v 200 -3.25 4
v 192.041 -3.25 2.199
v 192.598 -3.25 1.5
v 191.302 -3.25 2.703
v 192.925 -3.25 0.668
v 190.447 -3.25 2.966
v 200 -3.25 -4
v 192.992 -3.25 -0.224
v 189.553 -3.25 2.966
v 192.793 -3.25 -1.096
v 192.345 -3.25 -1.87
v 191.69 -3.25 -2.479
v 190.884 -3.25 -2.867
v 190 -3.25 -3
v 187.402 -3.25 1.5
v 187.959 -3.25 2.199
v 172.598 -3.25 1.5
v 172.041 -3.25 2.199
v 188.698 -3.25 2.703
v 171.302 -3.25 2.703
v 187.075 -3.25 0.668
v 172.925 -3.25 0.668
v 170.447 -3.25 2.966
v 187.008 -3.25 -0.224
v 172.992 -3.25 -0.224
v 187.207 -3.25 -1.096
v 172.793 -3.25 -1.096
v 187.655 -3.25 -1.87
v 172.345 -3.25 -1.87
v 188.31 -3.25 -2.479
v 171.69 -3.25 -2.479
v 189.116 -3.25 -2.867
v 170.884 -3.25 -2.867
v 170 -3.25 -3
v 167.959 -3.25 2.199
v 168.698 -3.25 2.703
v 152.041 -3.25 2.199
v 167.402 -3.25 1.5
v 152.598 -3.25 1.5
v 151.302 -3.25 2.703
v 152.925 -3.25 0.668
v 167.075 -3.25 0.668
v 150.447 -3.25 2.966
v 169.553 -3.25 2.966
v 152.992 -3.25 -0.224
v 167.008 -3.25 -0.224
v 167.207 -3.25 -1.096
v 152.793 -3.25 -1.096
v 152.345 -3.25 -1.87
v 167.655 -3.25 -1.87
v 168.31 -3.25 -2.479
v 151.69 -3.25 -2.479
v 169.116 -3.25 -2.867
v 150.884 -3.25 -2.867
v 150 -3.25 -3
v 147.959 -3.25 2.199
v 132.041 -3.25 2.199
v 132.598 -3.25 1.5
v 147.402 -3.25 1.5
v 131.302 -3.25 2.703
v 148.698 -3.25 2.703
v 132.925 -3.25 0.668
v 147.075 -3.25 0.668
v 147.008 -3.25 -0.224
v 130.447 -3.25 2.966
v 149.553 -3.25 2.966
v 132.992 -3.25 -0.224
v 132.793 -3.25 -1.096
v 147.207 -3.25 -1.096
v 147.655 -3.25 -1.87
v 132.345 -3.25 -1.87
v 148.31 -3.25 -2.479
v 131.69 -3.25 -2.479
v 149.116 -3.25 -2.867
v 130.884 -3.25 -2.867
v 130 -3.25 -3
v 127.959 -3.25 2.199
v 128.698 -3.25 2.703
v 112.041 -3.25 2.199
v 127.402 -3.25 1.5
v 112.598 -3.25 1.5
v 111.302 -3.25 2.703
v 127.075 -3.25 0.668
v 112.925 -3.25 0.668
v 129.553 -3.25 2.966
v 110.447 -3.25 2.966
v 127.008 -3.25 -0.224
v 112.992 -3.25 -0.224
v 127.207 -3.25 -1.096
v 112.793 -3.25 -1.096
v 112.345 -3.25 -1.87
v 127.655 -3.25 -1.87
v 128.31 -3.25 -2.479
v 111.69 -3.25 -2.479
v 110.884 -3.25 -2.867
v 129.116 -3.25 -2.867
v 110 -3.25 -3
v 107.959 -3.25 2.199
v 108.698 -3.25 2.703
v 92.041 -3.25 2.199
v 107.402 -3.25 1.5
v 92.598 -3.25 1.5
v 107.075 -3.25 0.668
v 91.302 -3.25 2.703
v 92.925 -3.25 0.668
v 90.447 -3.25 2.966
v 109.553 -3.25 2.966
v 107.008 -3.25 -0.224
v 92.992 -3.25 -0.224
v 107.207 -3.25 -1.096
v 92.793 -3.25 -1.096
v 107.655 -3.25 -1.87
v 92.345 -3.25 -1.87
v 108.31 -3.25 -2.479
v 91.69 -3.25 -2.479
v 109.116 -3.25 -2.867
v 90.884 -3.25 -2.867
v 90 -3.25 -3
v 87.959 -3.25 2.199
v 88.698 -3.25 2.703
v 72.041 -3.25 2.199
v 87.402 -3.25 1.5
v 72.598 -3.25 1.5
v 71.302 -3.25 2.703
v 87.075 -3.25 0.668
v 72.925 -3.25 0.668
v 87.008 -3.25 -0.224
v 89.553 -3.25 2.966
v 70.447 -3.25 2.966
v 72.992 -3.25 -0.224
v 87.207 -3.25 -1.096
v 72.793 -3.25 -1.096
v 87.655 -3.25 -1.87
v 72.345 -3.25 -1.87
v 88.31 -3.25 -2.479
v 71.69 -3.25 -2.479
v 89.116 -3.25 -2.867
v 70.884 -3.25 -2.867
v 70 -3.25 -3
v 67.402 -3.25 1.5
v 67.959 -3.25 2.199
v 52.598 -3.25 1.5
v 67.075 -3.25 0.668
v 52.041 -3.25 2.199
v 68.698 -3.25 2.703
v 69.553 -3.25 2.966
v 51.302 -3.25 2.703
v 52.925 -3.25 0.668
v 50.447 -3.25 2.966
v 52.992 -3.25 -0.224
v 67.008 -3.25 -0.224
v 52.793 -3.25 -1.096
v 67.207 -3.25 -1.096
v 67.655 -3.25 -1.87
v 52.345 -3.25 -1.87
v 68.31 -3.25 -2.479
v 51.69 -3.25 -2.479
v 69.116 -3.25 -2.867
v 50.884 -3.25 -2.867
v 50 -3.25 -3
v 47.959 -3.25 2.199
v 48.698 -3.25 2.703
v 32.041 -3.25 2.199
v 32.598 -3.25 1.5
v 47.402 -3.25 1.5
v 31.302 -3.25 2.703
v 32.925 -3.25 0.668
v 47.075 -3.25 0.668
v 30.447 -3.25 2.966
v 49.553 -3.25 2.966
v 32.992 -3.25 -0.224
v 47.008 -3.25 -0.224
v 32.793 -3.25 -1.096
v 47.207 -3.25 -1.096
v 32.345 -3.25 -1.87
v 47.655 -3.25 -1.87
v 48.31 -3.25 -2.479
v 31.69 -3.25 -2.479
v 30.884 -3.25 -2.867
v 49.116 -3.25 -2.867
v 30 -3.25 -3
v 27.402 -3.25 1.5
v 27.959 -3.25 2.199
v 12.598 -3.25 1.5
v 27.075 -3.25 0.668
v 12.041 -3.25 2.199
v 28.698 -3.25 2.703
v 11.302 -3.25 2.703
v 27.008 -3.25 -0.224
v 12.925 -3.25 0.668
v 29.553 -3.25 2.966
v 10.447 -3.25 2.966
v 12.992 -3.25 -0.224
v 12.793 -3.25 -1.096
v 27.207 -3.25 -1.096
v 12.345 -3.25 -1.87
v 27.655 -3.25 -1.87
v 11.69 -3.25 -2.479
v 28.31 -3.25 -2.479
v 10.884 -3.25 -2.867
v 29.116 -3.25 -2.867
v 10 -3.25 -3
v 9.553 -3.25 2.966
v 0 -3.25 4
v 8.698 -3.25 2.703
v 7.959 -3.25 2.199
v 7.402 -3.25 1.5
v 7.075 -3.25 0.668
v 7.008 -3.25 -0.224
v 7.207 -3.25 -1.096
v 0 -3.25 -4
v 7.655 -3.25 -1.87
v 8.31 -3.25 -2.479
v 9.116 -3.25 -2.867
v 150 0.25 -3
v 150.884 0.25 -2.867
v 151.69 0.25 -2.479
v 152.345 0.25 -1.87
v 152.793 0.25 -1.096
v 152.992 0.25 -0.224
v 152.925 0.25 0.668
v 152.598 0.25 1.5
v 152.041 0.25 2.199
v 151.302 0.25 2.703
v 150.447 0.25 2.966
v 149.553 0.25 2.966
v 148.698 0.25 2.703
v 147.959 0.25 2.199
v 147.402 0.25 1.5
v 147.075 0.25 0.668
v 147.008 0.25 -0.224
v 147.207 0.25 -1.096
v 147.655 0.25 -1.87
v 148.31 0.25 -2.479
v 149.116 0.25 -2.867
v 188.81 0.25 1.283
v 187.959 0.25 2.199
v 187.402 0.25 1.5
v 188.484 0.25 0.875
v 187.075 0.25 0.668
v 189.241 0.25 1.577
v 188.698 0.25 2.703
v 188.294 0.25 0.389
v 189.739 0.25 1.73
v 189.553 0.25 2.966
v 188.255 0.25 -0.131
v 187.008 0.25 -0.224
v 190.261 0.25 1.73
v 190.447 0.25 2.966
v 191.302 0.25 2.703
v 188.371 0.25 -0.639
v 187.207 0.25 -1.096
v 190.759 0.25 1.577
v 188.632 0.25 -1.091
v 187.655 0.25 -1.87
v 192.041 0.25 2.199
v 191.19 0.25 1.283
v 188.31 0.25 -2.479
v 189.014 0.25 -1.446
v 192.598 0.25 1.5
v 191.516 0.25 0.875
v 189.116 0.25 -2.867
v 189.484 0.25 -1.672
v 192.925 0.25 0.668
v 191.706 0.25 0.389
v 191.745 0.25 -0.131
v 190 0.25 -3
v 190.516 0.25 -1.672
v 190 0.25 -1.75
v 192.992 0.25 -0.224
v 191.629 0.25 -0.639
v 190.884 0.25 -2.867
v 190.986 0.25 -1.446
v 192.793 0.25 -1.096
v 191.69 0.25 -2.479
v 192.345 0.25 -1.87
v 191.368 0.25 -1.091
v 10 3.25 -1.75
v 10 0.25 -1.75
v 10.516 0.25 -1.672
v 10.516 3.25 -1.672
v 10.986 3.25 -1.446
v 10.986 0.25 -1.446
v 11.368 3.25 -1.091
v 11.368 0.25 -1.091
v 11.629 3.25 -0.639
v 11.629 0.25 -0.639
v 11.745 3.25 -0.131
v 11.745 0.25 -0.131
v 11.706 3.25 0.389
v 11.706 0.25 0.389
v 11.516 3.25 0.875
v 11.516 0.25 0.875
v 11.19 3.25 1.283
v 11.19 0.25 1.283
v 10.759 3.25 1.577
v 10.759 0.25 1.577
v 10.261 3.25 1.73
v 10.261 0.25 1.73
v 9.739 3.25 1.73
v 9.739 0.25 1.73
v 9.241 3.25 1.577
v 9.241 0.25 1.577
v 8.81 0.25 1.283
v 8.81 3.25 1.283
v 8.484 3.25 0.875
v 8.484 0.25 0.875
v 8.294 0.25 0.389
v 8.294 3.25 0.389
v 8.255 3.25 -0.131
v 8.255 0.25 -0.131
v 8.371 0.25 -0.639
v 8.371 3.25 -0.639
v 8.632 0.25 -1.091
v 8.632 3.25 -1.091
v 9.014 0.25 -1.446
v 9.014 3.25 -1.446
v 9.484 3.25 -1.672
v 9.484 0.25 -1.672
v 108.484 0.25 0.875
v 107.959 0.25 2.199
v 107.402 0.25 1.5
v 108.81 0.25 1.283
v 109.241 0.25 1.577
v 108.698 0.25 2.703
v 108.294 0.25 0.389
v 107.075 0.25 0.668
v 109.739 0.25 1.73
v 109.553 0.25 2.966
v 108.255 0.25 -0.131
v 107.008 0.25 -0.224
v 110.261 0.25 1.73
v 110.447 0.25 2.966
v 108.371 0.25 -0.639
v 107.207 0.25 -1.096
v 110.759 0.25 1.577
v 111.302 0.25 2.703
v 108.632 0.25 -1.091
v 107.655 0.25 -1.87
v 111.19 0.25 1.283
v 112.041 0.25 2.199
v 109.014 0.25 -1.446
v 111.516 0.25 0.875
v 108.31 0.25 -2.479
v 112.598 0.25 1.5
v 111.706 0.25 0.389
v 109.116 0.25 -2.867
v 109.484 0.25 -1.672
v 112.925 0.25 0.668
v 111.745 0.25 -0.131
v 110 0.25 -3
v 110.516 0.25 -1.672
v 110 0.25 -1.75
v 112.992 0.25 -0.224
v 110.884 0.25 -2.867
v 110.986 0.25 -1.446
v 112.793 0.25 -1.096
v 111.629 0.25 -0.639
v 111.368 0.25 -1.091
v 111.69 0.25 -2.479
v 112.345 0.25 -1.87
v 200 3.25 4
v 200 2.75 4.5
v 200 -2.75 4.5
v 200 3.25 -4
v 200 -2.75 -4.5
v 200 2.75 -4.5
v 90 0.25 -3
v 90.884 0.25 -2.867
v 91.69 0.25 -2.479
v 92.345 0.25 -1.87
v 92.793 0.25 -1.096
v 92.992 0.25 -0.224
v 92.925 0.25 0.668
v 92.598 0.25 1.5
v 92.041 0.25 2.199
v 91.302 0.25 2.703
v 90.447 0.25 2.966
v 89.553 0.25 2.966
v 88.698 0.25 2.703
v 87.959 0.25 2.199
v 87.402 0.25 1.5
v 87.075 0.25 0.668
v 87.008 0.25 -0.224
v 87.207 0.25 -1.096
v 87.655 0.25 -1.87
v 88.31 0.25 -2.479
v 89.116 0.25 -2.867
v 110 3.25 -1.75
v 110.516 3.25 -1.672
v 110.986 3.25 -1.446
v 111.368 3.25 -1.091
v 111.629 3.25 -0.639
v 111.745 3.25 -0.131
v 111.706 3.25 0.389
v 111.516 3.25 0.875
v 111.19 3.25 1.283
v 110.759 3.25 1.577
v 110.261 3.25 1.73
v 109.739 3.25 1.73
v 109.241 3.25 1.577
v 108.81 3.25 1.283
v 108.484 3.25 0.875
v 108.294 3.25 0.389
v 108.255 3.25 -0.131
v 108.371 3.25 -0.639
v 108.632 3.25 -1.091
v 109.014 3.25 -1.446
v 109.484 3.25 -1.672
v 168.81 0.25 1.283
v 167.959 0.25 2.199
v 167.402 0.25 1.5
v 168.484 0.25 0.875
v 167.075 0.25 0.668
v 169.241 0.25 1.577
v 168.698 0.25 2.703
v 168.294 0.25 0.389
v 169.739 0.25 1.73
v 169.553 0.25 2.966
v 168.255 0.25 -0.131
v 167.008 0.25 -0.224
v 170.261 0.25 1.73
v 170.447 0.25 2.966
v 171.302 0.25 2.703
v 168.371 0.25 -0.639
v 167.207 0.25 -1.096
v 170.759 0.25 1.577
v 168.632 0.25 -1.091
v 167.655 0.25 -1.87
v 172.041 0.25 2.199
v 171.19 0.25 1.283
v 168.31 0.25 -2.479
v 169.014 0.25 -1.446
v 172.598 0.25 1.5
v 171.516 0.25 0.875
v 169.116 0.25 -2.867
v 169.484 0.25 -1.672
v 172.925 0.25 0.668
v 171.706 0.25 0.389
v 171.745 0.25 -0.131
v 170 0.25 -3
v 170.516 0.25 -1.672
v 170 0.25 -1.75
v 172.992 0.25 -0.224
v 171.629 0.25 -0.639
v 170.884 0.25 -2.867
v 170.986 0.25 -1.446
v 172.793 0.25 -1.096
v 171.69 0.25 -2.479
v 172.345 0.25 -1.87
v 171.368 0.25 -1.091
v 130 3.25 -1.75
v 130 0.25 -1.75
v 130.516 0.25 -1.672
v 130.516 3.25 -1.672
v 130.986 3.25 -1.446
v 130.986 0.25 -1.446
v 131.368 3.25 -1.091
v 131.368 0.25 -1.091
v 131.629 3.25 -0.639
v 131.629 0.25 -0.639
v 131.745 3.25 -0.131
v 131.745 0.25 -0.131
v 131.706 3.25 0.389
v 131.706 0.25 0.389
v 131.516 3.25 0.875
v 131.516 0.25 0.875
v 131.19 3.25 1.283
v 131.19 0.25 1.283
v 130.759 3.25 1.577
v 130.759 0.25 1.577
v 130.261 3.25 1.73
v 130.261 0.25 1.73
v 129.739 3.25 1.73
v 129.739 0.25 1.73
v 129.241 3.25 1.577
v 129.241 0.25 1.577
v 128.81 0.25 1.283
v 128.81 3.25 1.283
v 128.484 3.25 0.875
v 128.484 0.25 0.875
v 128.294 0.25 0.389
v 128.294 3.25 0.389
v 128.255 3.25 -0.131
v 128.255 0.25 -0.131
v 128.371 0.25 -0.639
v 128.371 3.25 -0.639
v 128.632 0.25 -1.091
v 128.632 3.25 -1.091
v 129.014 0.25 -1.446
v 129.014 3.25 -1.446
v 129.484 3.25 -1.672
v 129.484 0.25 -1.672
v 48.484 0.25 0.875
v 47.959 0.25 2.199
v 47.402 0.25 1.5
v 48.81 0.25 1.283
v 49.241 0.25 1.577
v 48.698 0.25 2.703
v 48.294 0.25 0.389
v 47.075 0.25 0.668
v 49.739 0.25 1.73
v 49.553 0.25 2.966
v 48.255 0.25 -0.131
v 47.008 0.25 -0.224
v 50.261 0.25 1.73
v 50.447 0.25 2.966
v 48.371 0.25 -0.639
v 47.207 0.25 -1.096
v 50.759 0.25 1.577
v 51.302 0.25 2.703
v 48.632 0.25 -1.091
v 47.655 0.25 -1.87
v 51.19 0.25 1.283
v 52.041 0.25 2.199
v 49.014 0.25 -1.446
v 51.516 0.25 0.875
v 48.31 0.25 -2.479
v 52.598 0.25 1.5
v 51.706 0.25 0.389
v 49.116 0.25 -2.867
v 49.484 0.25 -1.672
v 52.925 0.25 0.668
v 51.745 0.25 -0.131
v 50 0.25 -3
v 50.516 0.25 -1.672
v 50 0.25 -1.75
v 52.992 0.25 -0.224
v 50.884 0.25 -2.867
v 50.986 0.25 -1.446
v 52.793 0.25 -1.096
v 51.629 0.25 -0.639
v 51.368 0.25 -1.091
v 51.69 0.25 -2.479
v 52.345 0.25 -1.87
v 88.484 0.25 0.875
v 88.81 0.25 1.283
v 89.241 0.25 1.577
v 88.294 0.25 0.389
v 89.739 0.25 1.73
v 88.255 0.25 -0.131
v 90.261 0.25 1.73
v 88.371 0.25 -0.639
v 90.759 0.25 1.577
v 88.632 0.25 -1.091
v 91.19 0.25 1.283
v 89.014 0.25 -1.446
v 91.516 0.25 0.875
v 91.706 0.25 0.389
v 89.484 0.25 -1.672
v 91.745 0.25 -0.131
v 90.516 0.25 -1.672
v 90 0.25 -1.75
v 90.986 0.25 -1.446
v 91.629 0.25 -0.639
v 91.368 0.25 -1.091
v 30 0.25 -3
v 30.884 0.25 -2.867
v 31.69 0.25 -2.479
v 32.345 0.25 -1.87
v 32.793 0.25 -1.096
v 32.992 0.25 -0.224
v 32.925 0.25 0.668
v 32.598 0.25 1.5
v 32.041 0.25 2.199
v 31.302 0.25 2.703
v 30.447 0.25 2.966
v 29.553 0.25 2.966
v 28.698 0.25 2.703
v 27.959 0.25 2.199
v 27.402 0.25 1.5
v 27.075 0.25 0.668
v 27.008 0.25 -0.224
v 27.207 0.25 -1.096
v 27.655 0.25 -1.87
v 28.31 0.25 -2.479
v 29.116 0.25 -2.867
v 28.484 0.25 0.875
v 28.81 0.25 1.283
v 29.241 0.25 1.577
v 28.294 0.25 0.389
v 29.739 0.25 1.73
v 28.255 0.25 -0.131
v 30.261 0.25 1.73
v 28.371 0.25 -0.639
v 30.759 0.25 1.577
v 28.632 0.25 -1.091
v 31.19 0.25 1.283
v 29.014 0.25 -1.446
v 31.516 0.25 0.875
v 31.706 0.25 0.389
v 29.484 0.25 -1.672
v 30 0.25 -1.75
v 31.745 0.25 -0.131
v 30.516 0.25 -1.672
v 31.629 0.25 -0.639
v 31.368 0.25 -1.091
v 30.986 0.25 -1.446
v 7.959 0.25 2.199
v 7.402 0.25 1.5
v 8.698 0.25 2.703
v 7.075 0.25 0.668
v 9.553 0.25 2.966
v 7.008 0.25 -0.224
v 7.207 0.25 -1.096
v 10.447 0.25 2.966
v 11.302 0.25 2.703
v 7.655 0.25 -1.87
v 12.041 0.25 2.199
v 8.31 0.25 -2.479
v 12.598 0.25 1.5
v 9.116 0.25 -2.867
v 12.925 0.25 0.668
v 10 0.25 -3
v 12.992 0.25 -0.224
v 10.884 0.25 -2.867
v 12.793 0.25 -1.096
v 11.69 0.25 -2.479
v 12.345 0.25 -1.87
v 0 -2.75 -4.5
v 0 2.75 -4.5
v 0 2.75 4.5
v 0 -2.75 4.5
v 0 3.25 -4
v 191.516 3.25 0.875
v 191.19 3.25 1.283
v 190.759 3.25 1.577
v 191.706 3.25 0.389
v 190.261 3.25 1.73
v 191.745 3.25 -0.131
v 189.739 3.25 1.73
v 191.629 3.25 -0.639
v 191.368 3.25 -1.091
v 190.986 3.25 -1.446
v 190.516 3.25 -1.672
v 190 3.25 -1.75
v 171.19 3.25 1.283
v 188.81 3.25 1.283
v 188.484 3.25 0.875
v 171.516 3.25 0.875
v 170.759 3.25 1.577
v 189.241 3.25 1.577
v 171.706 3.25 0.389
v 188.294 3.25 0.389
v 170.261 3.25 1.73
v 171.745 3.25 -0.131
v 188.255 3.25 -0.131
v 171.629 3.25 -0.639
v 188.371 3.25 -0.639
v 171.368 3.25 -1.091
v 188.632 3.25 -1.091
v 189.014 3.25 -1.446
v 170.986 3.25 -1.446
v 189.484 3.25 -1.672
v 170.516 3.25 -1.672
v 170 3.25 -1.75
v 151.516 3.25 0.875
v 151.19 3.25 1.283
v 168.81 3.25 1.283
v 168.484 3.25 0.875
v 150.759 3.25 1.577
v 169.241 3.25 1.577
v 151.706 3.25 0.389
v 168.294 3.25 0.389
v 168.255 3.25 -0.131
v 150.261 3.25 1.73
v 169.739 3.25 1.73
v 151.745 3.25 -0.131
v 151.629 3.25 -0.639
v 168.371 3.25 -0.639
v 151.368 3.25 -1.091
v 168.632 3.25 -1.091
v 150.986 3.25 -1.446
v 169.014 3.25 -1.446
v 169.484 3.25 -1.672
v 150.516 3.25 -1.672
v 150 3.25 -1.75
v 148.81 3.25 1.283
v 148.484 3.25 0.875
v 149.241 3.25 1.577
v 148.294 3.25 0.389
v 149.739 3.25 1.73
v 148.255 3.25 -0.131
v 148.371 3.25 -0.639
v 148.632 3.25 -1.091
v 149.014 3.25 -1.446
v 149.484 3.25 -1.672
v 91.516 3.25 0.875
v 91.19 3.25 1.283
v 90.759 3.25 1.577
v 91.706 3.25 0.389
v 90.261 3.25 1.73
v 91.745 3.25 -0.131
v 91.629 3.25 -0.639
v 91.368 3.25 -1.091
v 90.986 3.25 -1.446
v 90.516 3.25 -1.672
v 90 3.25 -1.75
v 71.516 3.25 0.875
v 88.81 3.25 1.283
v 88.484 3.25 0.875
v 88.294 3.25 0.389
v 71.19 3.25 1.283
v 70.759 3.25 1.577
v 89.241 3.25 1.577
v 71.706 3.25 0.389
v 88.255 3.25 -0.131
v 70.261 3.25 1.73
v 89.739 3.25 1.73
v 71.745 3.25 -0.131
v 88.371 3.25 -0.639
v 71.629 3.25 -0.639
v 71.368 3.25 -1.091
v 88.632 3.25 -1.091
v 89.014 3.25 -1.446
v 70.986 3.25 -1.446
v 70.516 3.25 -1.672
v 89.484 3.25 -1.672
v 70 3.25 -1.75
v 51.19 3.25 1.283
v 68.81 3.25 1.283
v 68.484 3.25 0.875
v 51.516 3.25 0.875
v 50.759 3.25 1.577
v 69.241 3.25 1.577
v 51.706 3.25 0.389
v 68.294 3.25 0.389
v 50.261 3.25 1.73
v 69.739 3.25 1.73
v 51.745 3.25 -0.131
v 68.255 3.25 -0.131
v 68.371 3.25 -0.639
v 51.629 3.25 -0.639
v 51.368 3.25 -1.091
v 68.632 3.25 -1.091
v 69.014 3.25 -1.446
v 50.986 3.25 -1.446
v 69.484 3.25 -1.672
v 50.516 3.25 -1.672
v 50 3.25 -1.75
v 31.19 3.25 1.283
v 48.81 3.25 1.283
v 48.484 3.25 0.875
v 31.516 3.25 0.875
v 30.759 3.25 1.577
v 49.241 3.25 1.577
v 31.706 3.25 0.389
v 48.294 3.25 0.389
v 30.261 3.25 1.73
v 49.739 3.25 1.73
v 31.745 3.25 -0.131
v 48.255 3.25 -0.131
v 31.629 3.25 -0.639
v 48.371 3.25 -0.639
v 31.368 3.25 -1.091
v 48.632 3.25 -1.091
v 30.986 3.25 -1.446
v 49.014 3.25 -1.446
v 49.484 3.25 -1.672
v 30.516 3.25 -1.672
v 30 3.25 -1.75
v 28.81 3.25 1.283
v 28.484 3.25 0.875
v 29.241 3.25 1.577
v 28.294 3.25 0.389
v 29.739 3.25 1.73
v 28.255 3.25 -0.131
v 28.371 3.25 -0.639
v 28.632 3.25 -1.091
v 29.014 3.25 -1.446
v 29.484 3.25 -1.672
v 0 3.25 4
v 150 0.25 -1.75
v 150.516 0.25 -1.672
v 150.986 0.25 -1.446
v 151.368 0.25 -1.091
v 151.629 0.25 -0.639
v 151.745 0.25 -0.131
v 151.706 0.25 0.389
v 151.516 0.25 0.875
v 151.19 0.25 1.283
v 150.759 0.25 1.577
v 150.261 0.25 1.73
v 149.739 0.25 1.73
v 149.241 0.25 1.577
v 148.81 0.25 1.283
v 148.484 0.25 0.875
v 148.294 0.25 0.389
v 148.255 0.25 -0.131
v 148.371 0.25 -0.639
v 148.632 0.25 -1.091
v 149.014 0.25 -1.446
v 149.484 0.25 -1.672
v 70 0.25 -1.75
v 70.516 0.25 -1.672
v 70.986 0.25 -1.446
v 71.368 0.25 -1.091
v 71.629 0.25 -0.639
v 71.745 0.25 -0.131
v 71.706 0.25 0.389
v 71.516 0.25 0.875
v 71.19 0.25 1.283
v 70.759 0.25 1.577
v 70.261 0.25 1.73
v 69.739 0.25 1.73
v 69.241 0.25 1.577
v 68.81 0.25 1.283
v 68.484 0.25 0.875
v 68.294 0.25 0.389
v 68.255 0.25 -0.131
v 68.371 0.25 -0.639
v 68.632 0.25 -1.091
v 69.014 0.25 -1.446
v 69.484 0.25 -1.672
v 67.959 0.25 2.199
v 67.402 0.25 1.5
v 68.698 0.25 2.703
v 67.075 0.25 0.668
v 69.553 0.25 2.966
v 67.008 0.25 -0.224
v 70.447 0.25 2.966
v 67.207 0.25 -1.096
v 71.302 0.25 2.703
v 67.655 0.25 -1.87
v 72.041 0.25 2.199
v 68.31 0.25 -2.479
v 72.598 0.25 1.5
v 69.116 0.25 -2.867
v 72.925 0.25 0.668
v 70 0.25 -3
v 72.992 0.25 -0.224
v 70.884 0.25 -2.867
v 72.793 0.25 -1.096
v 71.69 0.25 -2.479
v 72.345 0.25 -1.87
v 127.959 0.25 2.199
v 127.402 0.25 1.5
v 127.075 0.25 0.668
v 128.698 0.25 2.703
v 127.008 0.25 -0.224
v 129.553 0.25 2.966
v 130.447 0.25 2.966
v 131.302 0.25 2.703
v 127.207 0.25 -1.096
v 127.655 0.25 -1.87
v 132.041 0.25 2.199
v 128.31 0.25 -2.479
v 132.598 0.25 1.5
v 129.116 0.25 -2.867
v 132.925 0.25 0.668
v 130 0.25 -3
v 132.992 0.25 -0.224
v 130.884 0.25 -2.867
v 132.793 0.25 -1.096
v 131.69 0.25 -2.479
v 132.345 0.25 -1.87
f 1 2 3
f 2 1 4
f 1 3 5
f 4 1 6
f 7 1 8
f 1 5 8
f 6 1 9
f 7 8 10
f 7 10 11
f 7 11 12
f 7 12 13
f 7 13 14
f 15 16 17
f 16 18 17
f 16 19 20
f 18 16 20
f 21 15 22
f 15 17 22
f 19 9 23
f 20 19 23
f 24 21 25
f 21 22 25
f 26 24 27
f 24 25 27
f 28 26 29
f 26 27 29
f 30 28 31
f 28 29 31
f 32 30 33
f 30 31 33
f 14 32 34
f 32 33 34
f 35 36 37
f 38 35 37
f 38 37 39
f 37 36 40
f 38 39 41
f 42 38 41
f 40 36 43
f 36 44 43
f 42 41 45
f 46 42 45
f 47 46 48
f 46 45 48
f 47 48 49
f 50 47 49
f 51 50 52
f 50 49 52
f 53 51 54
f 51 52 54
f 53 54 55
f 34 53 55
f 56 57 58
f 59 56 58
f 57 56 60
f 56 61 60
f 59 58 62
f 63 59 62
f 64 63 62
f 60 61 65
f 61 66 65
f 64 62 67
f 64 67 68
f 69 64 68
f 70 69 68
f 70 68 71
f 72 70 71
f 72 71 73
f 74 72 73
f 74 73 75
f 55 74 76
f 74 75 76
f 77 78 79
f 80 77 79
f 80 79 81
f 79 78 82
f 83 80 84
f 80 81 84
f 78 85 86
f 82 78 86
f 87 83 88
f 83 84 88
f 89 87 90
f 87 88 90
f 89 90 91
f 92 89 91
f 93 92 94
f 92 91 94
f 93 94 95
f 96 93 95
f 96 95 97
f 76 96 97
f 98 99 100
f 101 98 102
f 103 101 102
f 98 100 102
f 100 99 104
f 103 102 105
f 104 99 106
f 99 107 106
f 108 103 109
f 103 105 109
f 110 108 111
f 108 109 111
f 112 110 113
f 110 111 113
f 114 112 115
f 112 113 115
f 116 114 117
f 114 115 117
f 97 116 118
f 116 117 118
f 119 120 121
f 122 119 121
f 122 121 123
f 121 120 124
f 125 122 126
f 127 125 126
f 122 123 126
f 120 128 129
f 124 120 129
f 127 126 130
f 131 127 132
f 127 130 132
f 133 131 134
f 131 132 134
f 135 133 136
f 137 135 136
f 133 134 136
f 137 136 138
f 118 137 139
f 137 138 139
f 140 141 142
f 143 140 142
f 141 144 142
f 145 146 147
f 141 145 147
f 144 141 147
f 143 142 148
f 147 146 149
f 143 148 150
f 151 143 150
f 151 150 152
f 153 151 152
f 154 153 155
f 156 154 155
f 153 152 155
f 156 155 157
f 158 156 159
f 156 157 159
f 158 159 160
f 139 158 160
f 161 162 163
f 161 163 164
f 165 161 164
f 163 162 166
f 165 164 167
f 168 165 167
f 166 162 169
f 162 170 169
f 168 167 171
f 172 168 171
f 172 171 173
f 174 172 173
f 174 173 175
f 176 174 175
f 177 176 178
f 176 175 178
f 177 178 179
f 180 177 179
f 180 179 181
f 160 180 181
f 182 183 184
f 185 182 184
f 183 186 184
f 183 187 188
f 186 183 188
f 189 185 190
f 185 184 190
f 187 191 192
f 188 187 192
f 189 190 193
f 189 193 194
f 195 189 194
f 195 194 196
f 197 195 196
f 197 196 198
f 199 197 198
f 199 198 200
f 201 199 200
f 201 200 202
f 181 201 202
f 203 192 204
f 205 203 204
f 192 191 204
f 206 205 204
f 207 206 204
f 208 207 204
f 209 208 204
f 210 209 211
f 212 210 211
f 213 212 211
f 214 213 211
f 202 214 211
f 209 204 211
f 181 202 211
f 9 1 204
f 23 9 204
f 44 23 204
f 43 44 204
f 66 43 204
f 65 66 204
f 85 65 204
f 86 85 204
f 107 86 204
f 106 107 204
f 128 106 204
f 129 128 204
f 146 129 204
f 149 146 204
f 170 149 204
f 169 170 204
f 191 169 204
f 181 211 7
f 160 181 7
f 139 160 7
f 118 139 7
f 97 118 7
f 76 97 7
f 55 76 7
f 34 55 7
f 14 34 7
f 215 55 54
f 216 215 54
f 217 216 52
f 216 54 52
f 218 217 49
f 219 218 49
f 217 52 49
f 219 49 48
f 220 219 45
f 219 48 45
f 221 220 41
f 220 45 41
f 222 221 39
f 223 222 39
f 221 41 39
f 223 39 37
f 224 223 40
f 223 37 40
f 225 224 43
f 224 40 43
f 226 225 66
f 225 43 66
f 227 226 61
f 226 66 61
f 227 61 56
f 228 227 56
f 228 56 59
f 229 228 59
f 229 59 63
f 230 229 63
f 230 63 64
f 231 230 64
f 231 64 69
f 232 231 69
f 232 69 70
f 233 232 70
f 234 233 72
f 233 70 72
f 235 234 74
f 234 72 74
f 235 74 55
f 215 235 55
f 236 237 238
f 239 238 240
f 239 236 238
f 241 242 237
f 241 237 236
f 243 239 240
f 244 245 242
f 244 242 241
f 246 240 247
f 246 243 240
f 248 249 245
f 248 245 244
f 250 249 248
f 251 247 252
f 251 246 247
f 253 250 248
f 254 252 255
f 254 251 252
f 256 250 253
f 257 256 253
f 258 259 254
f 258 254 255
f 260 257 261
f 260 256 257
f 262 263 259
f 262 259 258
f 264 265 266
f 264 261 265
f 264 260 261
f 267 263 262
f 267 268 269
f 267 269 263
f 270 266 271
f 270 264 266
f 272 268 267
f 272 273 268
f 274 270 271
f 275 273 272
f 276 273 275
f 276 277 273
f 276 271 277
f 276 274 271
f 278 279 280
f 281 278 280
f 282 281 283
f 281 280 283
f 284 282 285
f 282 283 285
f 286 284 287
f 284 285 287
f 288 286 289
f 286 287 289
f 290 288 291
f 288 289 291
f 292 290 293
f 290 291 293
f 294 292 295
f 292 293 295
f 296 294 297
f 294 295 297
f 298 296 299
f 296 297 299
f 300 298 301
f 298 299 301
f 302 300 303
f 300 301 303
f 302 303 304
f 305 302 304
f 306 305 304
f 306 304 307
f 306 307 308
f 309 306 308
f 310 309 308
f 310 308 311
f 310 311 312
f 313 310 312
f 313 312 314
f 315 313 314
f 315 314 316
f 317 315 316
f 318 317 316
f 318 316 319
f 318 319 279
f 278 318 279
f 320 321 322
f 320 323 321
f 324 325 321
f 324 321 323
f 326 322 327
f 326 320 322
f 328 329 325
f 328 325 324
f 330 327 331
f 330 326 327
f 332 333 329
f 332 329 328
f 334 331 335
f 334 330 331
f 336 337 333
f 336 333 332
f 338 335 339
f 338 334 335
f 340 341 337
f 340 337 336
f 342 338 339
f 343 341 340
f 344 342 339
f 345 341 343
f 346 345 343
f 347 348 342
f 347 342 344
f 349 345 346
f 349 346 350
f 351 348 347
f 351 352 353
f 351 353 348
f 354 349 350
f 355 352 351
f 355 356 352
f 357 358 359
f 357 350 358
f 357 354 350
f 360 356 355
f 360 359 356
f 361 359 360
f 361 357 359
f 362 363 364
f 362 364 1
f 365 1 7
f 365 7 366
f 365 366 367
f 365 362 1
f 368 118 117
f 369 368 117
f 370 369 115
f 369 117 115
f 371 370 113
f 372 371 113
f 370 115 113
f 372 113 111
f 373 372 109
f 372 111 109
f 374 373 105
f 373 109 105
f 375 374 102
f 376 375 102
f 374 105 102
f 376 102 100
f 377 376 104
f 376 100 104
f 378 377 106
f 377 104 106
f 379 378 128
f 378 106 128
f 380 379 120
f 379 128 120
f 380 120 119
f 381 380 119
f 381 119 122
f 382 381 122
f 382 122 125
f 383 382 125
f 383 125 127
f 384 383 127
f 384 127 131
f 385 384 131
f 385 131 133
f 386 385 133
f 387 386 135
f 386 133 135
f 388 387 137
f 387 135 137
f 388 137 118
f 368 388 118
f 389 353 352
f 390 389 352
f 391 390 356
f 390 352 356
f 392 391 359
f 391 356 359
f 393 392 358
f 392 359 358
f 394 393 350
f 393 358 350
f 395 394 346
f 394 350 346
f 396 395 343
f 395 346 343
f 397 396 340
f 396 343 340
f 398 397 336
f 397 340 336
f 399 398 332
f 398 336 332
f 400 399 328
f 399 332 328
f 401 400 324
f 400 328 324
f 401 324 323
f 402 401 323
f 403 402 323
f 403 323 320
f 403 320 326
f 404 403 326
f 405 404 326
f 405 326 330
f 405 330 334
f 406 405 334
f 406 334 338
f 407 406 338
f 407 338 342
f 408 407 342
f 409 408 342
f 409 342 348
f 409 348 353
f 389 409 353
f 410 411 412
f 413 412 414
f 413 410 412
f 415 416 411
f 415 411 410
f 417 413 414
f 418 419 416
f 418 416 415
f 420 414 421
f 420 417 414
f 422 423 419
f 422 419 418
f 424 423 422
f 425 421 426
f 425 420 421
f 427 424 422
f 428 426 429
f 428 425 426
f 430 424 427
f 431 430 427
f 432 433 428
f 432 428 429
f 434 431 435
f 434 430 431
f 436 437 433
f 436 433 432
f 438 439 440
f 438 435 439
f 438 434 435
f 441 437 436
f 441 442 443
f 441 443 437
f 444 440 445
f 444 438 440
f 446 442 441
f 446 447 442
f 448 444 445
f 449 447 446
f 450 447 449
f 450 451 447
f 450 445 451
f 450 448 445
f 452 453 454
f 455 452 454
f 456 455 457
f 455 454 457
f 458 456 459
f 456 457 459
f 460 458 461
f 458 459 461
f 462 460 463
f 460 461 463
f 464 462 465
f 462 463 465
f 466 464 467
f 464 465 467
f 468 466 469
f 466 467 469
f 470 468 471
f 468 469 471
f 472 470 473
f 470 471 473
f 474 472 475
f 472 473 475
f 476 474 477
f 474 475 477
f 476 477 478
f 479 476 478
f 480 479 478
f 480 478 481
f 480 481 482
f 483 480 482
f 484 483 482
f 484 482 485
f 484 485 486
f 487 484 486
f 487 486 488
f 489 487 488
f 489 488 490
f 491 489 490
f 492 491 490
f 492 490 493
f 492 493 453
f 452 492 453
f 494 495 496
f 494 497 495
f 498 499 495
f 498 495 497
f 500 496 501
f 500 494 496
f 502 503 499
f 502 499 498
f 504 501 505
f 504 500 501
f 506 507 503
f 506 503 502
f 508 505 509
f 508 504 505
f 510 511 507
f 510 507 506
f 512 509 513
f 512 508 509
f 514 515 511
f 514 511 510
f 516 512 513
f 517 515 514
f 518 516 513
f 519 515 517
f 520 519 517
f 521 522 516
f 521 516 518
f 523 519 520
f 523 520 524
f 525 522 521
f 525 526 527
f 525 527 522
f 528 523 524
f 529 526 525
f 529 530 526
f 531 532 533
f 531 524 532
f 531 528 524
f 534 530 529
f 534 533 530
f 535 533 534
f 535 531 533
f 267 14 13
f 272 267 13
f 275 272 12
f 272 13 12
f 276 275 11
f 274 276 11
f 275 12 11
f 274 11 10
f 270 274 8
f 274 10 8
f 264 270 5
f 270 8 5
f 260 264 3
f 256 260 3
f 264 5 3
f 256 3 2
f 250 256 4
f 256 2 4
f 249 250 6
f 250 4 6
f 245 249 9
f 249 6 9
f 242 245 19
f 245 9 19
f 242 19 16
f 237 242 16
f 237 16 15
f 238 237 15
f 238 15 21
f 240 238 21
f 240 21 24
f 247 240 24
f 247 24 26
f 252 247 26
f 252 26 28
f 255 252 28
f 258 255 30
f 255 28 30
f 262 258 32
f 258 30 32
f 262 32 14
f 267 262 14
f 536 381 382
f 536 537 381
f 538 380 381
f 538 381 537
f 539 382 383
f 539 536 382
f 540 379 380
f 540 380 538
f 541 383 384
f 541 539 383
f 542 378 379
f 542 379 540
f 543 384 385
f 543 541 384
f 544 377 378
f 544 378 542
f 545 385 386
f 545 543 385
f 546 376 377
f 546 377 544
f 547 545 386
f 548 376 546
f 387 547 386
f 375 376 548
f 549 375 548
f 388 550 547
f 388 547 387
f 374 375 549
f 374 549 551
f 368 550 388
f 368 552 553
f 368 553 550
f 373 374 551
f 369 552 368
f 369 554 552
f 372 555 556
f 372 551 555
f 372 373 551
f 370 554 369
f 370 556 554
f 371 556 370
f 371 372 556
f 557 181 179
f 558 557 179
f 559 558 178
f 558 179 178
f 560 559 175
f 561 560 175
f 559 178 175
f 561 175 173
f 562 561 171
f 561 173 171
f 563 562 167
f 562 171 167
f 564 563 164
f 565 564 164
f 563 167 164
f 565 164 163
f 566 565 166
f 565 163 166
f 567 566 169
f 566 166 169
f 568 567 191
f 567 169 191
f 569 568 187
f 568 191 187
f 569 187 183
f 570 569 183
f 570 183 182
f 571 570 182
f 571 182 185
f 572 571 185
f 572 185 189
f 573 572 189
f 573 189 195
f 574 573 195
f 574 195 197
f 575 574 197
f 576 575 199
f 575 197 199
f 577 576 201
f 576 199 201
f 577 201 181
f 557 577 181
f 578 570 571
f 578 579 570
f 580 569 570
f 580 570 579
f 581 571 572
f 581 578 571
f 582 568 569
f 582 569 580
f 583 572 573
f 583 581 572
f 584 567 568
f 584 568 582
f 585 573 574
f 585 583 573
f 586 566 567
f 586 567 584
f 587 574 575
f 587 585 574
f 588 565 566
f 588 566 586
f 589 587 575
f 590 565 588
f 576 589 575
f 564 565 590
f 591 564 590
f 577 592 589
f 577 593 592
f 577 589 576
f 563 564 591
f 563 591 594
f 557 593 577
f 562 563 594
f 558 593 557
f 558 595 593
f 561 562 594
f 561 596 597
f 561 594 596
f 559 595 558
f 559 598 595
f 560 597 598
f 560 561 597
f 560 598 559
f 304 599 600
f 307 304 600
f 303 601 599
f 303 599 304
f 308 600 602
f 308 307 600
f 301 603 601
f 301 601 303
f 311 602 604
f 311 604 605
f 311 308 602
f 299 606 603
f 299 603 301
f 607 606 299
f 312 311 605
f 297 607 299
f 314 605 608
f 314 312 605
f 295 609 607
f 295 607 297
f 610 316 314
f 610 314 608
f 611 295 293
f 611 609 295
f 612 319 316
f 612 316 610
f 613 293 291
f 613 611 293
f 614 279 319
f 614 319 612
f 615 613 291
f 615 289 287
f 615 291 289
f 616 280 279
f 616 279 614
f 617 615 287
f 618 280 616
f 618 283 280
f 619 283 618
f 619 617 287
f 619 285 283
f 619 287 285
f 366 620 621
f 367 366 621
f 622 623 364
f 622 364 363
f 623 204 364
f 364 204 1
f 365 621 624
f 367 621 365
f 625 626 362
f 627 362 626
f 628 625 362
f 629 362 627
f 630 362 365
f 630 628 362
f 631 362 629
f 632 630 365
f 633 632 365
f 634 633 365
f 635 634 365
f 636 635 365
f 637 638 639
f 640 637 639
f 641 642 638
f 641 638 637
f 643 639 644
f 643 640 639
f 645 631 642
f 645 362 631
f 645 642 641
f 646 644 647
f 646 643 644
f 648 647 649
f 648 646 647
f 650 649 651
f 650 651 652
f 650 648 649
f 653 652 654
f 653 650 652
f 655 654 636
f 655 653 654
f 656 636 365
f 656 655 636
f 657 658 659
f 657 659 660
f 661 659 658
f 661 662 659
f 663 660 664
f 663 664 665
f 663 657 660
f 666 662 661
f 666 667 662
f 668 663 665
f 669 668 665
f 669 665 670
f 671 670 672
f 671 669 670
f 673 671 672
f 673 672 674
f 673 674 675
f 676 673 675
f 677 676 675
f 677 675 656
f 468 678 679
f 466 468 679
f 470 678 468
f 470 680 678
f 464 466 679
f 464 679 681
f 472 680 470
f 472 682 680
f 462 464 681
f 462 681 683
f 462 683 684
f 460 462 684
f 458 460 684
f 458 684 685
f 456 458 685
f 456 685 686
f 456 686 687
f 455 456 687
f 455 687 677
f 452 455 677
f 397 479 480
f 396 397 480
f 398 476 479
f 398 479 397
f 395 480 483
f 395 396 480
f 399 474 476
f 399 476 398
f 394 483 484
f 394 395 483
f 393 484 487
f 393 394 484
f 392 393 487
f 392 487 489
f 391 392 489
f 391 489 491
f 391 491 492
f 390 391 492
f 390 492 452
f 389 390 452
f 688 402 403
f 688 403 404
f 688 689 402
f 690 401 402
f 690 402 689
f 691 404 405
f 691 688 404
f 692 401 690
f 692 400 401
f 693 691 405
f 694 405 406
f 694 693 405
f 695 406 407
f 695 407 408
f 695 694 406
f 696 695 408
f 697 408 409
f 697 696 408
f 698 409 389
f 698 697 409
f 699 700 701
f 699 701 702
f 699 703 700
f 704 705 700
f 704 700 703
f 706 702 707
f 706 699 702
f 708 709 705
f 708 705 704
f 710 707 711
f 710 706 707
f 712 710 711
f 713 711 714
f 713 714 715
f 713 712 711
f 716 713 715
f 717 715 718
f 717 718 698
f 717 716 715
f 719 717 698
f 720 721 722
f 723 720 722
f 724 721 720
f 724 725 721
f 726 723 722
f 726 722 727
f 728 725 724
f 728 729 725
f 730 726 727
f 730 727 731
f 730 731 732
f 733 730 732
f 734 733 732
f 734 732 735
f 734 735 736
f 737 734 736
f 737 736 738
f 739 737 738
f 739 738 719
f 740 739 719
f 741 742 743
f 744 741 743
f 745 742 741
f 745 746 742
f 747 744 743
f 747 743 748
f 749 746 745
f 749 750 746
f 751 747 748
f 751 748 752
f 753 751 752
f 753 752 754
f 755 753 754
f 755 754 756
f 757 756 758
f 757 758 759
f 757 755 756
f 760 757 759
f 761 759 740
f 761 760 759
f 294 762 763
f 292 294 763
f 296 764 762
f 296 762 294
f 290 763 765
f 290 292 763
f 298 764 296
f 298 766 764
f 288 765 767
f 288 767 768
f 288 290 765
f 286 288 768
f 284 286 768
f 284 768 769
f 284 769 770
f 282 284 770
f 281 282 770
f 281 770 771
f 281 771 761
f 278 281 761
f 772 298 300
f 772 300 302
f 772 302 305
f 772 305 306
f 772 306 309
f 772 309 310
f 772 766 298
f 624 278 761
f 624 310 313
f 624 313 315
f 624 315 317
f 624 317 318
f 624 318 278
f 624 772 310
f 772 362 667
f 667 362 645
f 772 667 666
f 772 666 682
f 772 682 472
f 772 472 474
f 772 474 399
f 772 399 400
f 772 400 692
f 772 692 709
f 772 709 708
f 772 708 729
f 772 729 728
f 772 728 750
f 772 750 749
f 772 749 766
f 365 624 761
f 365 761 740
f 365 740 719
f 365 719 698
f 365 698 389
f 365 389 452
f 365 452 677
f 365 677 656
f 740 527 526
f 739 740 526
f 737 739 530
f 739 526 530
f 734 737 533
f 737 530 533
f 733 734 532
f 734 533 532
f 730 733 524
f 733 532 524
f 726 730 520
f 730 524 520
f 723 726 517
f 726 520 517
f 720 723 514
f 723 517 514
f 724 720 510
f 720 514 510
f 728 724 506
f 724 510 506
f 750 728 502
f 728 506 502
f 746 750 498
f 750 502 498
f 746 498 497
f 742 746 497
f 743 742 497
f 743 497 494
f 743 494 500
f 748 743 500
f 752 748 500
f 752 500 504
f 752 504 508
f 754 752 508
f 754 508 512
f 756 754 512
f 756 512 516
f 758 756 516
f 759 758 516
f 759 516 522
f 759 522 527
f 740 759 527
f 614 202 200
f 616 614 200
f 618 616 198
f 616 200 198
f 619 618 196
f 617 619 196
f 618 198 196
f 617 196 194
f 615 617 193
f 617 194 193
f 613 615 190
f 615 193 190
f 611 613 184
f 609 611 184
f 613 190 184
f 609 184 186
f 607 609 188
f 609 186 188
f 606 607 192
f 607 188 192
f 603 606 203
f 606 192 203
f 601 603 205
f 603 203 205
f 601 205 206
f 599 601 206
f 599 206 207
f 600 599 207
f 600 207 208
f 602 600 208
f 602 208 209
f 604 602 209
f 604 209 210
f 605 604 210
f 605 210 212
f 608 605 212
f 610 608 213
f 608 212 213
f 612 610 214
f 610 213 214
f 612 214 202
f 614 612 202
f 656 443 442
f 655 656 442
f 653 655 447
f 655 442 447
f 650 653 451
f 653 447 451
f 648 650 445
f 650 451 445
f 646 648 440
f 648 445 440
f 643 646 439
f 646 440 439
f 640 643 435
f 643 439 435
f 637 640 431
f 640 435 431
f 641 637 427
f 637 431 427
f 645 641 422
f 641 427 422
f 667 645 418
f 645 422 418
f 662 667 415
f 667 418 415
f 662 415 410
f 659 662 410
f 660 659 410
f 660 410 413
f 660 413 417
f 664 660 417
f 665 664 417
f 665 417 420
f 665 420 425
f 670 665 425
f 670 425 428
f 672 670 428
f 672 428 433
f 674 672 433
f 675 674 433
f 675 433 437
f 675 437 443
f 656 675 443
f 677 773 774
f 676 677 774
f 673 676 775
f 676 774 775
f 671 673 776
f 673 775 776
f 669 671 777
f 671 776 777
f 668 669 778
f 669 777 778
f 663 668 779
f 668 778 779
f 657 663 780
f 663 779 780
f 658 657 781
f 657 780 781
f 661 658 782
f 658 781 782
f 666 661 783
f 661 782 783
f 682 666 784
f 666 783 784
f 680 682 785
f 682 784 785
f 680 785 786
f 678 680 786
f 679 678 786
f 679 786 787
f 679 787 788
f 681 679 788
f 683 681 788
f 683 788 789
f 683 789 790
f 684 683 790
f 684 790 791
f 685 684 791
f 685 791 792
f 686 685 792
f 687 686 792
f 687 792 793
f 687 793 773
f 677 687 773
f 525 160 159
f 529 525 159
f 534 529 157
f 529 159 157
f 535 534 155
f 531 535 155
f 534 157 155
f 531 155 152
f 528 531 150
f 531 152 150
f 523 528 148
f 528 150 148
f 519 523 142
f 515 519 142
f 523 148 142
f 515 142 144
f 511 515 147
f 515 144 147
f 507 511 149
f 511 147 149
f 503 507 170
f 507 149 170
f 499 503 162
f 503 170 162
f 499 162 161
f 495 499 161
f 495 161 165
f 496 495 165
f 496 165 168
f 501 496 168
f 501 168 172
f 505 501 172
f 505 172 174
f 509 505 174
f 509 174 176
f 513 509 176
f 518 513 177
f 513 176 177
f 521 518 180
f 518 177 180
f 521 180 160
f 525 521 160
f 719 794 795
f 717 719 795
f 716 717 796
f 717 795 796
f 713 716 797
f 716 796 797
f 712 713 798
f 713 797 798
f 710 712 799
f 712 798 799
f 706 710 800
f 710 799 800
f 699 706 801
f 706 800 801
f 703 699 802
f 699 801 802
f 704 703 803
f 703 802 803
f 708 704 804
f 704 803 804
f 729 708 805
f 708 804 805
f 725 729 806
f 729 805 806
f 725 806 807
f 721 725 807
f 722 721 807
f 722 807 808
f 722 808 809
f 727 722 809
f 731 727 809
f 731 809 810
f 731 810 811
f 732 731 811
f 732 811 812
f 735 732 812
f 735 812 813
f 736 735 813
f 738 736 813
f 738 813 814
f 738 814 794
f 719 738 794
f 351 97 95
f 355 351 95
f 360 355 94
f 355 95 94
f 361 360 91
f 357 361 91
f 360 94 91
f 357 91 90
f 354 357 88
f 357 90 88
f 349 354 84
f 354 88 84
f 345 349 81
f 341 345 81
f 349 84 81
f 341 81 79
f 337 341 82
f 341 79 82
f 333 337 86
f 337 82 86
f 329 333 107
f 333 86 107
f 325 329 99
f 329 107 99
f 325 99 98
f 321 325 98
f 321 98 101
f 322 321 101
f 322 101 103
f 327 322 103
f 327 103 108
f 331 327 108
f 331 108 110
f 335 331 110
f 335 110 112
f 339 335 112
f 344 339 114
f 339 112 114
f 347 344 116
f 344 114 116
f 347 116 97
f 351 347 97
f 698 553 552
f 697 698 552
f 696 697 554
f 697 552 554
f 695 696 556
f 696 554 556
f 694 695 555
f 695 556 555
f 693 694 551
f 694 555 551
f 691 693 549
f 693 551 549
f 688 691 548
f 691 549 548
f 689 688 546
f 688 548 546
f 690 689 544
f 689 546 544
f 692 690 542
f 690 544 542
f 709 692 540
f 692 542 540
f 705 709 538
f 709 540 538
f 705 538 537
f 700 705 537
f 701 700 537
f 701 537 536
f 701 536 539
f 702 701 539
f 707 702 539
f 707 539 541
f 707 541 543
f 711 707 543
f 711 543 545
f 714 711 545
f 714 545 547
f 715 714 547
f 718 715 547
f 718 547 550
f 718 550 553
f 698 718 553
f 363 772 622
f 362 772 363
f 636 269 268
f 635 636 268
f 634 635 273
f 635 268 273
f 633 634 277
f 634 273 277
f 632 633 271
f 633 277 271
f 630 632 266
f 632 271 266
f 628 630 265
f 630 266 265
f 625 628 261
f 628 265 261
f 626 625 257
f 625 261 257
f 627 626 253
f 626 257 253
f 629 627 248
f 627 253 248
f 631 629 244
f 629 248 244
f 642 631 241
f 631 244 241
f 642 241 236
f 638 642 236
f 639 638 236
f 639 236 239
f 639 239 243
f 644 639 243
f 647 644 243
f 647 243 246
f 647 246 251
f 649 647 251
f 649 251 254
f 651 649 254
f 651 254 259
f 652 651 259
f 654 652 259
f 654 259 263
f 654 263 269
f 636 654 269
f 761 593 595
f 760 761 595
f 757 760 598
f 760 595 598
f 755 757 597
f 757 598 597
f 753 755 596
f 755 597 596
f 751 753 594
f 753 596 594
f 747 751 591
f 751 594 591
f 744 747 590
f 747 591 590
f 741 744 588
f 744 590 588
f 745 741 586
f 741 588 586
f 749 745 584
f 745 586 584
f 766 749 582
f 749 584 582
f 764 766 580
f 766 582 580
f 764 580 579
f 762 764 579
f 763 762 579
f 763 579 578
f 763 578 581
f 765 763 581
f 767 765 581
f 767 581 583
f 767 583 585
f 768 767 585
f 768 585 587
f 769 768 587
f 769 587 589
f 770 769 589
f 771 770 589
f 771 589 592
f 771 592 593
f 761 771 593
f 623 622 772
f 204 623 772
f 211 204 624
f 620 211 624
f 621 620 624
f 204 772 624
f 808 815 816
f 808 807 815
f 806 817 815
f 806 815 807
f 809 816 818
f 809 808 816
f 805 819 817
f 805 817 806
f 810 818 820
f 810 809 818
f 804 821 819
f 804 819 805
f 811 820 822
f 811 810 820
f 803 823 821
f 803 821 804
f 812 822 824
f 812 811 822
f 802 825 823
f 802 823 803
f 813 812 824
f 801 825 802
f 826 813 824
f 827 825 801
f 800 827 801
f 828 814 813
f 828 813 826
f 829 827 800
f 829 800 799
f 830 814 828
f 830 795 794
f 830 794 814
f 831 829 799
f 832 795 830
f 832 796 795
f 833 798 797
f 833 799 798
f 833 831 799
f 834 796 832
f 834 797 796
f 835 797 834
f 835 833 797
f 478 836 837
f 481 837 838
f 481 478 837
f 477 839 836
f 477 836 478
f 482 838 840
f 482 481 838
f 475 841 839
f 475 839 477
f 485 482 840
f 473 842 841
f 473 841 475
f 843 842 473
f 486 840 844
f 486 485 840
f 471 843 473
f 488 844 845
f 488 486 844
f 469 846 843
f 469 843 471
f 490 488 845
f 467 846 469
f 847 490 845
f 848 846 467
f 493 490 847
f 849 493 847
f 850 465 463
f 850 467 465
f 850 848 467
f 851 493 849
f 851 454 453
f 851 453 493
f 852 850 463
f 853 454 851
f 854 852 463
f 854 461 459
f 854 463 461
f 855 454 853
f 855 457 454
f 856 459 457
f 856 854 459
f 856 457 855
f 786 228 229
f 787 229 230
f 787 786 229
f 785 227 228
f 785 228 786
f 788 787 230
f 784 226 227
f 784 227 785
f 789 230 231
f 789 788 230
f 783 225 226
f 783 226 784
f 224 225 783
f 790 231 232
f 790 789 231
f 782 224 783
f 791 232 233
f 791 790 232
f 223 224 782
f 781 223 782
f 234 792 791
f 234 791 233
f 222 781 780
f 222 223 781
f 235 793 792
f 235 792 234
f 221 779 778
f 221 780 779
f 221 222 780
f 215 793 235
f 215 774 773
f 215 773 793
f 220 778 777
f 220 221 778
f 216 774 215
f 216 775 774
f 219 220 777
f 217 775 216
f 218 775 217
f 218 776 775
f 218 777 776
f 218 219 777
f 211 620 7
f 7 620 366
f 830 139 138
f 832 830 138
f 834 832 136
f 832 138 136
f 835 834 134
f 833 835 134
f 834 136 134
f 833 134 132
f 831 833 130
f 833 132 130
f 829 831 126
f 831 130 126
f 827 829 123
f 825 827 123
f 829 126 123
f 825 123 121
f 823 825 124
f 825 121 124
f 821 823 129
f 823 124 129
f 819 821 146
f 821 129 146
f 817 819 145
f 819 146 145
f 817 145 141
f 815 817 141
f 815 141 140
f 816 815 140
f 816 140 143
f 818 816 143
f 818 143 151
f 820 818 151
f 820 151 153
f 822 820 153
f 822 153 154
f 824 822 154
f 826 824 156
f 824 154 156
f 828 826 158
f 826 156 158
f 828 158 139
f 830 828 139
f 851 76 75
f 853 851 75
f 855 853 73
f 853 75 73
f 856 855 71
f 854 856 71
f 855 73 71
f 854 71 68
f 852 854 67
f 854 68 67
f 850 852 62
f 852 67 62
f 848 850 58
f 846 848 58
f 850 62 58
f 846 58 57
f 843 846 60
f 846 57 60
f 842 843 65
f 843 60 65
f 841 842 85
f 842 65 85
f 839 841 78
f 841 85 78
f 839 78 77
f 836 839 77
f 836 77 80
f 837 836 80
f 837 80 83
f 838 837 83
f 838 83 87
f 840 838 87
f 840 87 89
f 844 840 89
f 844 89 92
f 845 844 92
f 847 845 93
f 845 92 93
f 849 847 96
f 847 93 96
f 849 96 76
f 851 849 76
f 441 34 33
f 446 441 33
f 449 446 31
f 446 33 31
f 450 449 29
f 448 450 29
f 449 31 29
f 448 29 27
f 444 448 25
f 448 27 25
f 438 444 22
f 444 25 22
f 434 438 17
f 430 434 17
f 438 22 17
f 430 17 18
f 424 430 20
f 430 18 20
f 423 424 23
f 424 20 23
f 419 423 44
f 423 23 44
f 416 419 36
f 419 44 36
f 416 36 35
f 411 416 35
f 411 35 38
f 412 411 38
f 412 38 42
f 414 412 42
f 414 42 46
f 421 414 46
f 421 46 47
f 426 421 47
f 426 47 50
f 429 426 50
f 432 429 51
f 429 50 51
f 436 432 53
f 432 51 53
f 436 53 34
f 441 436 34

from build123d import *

# Parameters (mm, degrees)
SKETCH_1_W          = 9
SKETCH_1_H          = 6.5
EXTRUDE_1_DEPTH     = 200
SKETCH_2_R          = 1.75
CUT_EXTRUDE_2_DEPTH = 8
SKETCH_3_R          = 3
CUT_EXTRUDE_3_DEPTH = 3.5
CHAMFER_1_SIZE      = 0.5


with BuildPart() as part:
    # 草图1 → 拉伸1 (new body)
    with BuildSketch(Plane(origin=(0, 0, 0), x_dir=(0, 0, -1), z_dir=(1, 0, 0))):
        Rectangle(SKETCH_1_W, SKETCH_1_H)
    extrude(amount=EXTRUDE_1_DEPTH)

    # 草图2 → 拉伸2 (cut)
    with BuildSketch(Plane.XZ.offset(3.25)):
        with Locations(Location((10, 0, 0), (0, 0, 270))):
            Circle(SKETCH_2_R)
        with Locations(Location((170, 0, 0), (0, 0, 270))):
            Circle(SKETCH_2_R)
        with Locations(Location((190, 0, 0), (0, 0, 270))):
            Circle(SKETCH_2_R)
        with Locations((210, 0)):
            Circle(SKETCH_2_R)
        with Locations((230, 0)):
            Circle(SKETCH_2_R)
        with Locations((250, 0)):
            Circle(SKETCH_2_R)
        with Locations((270, 0)):
            Circle(SKETCH_2_R)
        with Locations((290, 0)):
            Circle(SKETCH_2_R)
        with Locations(Location((30, 0, 0), (0, 0, 270))):
            Circle(SKETCH_2_R)
        with Locations(Location((50, 0, 0), (0, 0, 270))):
            Circle(SKETCH_2_R)
        with Locations(Location((70, 0, 0), (0, 0, 270))):
            Circle(SKETCH_2_R)
        with Locations(Location((90, 0, 0), (0, 0, 270))):
            Circle(SKETCH_2_R)
        with Locations(Location((110, 0, 0), (0, 0, 270))):
            Circle(SKETCH_2_R)
        with Locations(Location((130, 0, 0), (0, 0, 270))):
            Circle(SKETCH_2_R)
        with Locations(Location((150, 0, 0), (0, 0, 270))):
            Circle(SKETCH_2_R)
    extrude(amount=-CUT_EXTRUDE_2_DEPTH, mode=Mode.SUBTRACT)

    # 草图3 → 拉伸3 (cut)
    with BuildSketch(Plane.XZ.offset(3.25)):
        with Locations(Location((10, 0, 0), (0, 0, 270))):
            Circle(SKETCH_3_R)
        with Locations(Location((170, 0, 0), (0, 0, 270))):
            Circle(SKETCH_3_R)
        with Locations(Location((190, 0, 0), (0, 0, 270))):
            Circle(SKETCH_3_R)
        with Locations((210, 0)):
            Circle(SKETCH_3_R)
        with Locations((230, 0)):
            Circle(SKETCH_3_R)
        with Locations((250, 0)):
            Circle(SKETCH_3_R)
        with Locations((270, 0)):
            Circle(SKETCH_3_R)
        with Locations((290, 0)):
            Circle(SKETCH_3_R)
        with Locations(Location((30, 0, 0), (0, 0, 270))):
            Circle(SKETCH_3_R)
        with Locations(Location((50, 0, 0), (0, 0, 270))):
            Circle(SKETCH_3_R)
        with Locations(Location((70, 0, 0), (0, 0, 270))):
            Circle(SKETCH_3_R)
        with Locations(Location((90, 0, 0), (0, 0, 270))):
            Circle(SKETCH_3_R)
        with Locations(Location((110, 0, 0), (0, 0, 270))):
            Circle(SKETCH_3_R)
        with Locations(Location((130, 0, 0), (0, 0, 270))):
            Circle(SKETCH_3_R)
        with Locations(Location((150, 0, 0), (0, 0, 270))):
            Circle(SKETCH_3_R)
    extrude(amount=-CUT_EXTRUDE_3_DEPTH, mode=Mode.SUBTRACT)

    # 倒角1
    chamfer_1_edges = [part.edges().sort_by_distance(p)[0] for p in [
        (100, 3.25, 4.5),
        (100, 3.25, -4.5),
        (100, -3.25, -4.5),
        (100, -3.25, 4.5),
    ]]
    chamfer(chamfer_1_edges, length=CHAMFER_1_SIZE)


solid = part.part
